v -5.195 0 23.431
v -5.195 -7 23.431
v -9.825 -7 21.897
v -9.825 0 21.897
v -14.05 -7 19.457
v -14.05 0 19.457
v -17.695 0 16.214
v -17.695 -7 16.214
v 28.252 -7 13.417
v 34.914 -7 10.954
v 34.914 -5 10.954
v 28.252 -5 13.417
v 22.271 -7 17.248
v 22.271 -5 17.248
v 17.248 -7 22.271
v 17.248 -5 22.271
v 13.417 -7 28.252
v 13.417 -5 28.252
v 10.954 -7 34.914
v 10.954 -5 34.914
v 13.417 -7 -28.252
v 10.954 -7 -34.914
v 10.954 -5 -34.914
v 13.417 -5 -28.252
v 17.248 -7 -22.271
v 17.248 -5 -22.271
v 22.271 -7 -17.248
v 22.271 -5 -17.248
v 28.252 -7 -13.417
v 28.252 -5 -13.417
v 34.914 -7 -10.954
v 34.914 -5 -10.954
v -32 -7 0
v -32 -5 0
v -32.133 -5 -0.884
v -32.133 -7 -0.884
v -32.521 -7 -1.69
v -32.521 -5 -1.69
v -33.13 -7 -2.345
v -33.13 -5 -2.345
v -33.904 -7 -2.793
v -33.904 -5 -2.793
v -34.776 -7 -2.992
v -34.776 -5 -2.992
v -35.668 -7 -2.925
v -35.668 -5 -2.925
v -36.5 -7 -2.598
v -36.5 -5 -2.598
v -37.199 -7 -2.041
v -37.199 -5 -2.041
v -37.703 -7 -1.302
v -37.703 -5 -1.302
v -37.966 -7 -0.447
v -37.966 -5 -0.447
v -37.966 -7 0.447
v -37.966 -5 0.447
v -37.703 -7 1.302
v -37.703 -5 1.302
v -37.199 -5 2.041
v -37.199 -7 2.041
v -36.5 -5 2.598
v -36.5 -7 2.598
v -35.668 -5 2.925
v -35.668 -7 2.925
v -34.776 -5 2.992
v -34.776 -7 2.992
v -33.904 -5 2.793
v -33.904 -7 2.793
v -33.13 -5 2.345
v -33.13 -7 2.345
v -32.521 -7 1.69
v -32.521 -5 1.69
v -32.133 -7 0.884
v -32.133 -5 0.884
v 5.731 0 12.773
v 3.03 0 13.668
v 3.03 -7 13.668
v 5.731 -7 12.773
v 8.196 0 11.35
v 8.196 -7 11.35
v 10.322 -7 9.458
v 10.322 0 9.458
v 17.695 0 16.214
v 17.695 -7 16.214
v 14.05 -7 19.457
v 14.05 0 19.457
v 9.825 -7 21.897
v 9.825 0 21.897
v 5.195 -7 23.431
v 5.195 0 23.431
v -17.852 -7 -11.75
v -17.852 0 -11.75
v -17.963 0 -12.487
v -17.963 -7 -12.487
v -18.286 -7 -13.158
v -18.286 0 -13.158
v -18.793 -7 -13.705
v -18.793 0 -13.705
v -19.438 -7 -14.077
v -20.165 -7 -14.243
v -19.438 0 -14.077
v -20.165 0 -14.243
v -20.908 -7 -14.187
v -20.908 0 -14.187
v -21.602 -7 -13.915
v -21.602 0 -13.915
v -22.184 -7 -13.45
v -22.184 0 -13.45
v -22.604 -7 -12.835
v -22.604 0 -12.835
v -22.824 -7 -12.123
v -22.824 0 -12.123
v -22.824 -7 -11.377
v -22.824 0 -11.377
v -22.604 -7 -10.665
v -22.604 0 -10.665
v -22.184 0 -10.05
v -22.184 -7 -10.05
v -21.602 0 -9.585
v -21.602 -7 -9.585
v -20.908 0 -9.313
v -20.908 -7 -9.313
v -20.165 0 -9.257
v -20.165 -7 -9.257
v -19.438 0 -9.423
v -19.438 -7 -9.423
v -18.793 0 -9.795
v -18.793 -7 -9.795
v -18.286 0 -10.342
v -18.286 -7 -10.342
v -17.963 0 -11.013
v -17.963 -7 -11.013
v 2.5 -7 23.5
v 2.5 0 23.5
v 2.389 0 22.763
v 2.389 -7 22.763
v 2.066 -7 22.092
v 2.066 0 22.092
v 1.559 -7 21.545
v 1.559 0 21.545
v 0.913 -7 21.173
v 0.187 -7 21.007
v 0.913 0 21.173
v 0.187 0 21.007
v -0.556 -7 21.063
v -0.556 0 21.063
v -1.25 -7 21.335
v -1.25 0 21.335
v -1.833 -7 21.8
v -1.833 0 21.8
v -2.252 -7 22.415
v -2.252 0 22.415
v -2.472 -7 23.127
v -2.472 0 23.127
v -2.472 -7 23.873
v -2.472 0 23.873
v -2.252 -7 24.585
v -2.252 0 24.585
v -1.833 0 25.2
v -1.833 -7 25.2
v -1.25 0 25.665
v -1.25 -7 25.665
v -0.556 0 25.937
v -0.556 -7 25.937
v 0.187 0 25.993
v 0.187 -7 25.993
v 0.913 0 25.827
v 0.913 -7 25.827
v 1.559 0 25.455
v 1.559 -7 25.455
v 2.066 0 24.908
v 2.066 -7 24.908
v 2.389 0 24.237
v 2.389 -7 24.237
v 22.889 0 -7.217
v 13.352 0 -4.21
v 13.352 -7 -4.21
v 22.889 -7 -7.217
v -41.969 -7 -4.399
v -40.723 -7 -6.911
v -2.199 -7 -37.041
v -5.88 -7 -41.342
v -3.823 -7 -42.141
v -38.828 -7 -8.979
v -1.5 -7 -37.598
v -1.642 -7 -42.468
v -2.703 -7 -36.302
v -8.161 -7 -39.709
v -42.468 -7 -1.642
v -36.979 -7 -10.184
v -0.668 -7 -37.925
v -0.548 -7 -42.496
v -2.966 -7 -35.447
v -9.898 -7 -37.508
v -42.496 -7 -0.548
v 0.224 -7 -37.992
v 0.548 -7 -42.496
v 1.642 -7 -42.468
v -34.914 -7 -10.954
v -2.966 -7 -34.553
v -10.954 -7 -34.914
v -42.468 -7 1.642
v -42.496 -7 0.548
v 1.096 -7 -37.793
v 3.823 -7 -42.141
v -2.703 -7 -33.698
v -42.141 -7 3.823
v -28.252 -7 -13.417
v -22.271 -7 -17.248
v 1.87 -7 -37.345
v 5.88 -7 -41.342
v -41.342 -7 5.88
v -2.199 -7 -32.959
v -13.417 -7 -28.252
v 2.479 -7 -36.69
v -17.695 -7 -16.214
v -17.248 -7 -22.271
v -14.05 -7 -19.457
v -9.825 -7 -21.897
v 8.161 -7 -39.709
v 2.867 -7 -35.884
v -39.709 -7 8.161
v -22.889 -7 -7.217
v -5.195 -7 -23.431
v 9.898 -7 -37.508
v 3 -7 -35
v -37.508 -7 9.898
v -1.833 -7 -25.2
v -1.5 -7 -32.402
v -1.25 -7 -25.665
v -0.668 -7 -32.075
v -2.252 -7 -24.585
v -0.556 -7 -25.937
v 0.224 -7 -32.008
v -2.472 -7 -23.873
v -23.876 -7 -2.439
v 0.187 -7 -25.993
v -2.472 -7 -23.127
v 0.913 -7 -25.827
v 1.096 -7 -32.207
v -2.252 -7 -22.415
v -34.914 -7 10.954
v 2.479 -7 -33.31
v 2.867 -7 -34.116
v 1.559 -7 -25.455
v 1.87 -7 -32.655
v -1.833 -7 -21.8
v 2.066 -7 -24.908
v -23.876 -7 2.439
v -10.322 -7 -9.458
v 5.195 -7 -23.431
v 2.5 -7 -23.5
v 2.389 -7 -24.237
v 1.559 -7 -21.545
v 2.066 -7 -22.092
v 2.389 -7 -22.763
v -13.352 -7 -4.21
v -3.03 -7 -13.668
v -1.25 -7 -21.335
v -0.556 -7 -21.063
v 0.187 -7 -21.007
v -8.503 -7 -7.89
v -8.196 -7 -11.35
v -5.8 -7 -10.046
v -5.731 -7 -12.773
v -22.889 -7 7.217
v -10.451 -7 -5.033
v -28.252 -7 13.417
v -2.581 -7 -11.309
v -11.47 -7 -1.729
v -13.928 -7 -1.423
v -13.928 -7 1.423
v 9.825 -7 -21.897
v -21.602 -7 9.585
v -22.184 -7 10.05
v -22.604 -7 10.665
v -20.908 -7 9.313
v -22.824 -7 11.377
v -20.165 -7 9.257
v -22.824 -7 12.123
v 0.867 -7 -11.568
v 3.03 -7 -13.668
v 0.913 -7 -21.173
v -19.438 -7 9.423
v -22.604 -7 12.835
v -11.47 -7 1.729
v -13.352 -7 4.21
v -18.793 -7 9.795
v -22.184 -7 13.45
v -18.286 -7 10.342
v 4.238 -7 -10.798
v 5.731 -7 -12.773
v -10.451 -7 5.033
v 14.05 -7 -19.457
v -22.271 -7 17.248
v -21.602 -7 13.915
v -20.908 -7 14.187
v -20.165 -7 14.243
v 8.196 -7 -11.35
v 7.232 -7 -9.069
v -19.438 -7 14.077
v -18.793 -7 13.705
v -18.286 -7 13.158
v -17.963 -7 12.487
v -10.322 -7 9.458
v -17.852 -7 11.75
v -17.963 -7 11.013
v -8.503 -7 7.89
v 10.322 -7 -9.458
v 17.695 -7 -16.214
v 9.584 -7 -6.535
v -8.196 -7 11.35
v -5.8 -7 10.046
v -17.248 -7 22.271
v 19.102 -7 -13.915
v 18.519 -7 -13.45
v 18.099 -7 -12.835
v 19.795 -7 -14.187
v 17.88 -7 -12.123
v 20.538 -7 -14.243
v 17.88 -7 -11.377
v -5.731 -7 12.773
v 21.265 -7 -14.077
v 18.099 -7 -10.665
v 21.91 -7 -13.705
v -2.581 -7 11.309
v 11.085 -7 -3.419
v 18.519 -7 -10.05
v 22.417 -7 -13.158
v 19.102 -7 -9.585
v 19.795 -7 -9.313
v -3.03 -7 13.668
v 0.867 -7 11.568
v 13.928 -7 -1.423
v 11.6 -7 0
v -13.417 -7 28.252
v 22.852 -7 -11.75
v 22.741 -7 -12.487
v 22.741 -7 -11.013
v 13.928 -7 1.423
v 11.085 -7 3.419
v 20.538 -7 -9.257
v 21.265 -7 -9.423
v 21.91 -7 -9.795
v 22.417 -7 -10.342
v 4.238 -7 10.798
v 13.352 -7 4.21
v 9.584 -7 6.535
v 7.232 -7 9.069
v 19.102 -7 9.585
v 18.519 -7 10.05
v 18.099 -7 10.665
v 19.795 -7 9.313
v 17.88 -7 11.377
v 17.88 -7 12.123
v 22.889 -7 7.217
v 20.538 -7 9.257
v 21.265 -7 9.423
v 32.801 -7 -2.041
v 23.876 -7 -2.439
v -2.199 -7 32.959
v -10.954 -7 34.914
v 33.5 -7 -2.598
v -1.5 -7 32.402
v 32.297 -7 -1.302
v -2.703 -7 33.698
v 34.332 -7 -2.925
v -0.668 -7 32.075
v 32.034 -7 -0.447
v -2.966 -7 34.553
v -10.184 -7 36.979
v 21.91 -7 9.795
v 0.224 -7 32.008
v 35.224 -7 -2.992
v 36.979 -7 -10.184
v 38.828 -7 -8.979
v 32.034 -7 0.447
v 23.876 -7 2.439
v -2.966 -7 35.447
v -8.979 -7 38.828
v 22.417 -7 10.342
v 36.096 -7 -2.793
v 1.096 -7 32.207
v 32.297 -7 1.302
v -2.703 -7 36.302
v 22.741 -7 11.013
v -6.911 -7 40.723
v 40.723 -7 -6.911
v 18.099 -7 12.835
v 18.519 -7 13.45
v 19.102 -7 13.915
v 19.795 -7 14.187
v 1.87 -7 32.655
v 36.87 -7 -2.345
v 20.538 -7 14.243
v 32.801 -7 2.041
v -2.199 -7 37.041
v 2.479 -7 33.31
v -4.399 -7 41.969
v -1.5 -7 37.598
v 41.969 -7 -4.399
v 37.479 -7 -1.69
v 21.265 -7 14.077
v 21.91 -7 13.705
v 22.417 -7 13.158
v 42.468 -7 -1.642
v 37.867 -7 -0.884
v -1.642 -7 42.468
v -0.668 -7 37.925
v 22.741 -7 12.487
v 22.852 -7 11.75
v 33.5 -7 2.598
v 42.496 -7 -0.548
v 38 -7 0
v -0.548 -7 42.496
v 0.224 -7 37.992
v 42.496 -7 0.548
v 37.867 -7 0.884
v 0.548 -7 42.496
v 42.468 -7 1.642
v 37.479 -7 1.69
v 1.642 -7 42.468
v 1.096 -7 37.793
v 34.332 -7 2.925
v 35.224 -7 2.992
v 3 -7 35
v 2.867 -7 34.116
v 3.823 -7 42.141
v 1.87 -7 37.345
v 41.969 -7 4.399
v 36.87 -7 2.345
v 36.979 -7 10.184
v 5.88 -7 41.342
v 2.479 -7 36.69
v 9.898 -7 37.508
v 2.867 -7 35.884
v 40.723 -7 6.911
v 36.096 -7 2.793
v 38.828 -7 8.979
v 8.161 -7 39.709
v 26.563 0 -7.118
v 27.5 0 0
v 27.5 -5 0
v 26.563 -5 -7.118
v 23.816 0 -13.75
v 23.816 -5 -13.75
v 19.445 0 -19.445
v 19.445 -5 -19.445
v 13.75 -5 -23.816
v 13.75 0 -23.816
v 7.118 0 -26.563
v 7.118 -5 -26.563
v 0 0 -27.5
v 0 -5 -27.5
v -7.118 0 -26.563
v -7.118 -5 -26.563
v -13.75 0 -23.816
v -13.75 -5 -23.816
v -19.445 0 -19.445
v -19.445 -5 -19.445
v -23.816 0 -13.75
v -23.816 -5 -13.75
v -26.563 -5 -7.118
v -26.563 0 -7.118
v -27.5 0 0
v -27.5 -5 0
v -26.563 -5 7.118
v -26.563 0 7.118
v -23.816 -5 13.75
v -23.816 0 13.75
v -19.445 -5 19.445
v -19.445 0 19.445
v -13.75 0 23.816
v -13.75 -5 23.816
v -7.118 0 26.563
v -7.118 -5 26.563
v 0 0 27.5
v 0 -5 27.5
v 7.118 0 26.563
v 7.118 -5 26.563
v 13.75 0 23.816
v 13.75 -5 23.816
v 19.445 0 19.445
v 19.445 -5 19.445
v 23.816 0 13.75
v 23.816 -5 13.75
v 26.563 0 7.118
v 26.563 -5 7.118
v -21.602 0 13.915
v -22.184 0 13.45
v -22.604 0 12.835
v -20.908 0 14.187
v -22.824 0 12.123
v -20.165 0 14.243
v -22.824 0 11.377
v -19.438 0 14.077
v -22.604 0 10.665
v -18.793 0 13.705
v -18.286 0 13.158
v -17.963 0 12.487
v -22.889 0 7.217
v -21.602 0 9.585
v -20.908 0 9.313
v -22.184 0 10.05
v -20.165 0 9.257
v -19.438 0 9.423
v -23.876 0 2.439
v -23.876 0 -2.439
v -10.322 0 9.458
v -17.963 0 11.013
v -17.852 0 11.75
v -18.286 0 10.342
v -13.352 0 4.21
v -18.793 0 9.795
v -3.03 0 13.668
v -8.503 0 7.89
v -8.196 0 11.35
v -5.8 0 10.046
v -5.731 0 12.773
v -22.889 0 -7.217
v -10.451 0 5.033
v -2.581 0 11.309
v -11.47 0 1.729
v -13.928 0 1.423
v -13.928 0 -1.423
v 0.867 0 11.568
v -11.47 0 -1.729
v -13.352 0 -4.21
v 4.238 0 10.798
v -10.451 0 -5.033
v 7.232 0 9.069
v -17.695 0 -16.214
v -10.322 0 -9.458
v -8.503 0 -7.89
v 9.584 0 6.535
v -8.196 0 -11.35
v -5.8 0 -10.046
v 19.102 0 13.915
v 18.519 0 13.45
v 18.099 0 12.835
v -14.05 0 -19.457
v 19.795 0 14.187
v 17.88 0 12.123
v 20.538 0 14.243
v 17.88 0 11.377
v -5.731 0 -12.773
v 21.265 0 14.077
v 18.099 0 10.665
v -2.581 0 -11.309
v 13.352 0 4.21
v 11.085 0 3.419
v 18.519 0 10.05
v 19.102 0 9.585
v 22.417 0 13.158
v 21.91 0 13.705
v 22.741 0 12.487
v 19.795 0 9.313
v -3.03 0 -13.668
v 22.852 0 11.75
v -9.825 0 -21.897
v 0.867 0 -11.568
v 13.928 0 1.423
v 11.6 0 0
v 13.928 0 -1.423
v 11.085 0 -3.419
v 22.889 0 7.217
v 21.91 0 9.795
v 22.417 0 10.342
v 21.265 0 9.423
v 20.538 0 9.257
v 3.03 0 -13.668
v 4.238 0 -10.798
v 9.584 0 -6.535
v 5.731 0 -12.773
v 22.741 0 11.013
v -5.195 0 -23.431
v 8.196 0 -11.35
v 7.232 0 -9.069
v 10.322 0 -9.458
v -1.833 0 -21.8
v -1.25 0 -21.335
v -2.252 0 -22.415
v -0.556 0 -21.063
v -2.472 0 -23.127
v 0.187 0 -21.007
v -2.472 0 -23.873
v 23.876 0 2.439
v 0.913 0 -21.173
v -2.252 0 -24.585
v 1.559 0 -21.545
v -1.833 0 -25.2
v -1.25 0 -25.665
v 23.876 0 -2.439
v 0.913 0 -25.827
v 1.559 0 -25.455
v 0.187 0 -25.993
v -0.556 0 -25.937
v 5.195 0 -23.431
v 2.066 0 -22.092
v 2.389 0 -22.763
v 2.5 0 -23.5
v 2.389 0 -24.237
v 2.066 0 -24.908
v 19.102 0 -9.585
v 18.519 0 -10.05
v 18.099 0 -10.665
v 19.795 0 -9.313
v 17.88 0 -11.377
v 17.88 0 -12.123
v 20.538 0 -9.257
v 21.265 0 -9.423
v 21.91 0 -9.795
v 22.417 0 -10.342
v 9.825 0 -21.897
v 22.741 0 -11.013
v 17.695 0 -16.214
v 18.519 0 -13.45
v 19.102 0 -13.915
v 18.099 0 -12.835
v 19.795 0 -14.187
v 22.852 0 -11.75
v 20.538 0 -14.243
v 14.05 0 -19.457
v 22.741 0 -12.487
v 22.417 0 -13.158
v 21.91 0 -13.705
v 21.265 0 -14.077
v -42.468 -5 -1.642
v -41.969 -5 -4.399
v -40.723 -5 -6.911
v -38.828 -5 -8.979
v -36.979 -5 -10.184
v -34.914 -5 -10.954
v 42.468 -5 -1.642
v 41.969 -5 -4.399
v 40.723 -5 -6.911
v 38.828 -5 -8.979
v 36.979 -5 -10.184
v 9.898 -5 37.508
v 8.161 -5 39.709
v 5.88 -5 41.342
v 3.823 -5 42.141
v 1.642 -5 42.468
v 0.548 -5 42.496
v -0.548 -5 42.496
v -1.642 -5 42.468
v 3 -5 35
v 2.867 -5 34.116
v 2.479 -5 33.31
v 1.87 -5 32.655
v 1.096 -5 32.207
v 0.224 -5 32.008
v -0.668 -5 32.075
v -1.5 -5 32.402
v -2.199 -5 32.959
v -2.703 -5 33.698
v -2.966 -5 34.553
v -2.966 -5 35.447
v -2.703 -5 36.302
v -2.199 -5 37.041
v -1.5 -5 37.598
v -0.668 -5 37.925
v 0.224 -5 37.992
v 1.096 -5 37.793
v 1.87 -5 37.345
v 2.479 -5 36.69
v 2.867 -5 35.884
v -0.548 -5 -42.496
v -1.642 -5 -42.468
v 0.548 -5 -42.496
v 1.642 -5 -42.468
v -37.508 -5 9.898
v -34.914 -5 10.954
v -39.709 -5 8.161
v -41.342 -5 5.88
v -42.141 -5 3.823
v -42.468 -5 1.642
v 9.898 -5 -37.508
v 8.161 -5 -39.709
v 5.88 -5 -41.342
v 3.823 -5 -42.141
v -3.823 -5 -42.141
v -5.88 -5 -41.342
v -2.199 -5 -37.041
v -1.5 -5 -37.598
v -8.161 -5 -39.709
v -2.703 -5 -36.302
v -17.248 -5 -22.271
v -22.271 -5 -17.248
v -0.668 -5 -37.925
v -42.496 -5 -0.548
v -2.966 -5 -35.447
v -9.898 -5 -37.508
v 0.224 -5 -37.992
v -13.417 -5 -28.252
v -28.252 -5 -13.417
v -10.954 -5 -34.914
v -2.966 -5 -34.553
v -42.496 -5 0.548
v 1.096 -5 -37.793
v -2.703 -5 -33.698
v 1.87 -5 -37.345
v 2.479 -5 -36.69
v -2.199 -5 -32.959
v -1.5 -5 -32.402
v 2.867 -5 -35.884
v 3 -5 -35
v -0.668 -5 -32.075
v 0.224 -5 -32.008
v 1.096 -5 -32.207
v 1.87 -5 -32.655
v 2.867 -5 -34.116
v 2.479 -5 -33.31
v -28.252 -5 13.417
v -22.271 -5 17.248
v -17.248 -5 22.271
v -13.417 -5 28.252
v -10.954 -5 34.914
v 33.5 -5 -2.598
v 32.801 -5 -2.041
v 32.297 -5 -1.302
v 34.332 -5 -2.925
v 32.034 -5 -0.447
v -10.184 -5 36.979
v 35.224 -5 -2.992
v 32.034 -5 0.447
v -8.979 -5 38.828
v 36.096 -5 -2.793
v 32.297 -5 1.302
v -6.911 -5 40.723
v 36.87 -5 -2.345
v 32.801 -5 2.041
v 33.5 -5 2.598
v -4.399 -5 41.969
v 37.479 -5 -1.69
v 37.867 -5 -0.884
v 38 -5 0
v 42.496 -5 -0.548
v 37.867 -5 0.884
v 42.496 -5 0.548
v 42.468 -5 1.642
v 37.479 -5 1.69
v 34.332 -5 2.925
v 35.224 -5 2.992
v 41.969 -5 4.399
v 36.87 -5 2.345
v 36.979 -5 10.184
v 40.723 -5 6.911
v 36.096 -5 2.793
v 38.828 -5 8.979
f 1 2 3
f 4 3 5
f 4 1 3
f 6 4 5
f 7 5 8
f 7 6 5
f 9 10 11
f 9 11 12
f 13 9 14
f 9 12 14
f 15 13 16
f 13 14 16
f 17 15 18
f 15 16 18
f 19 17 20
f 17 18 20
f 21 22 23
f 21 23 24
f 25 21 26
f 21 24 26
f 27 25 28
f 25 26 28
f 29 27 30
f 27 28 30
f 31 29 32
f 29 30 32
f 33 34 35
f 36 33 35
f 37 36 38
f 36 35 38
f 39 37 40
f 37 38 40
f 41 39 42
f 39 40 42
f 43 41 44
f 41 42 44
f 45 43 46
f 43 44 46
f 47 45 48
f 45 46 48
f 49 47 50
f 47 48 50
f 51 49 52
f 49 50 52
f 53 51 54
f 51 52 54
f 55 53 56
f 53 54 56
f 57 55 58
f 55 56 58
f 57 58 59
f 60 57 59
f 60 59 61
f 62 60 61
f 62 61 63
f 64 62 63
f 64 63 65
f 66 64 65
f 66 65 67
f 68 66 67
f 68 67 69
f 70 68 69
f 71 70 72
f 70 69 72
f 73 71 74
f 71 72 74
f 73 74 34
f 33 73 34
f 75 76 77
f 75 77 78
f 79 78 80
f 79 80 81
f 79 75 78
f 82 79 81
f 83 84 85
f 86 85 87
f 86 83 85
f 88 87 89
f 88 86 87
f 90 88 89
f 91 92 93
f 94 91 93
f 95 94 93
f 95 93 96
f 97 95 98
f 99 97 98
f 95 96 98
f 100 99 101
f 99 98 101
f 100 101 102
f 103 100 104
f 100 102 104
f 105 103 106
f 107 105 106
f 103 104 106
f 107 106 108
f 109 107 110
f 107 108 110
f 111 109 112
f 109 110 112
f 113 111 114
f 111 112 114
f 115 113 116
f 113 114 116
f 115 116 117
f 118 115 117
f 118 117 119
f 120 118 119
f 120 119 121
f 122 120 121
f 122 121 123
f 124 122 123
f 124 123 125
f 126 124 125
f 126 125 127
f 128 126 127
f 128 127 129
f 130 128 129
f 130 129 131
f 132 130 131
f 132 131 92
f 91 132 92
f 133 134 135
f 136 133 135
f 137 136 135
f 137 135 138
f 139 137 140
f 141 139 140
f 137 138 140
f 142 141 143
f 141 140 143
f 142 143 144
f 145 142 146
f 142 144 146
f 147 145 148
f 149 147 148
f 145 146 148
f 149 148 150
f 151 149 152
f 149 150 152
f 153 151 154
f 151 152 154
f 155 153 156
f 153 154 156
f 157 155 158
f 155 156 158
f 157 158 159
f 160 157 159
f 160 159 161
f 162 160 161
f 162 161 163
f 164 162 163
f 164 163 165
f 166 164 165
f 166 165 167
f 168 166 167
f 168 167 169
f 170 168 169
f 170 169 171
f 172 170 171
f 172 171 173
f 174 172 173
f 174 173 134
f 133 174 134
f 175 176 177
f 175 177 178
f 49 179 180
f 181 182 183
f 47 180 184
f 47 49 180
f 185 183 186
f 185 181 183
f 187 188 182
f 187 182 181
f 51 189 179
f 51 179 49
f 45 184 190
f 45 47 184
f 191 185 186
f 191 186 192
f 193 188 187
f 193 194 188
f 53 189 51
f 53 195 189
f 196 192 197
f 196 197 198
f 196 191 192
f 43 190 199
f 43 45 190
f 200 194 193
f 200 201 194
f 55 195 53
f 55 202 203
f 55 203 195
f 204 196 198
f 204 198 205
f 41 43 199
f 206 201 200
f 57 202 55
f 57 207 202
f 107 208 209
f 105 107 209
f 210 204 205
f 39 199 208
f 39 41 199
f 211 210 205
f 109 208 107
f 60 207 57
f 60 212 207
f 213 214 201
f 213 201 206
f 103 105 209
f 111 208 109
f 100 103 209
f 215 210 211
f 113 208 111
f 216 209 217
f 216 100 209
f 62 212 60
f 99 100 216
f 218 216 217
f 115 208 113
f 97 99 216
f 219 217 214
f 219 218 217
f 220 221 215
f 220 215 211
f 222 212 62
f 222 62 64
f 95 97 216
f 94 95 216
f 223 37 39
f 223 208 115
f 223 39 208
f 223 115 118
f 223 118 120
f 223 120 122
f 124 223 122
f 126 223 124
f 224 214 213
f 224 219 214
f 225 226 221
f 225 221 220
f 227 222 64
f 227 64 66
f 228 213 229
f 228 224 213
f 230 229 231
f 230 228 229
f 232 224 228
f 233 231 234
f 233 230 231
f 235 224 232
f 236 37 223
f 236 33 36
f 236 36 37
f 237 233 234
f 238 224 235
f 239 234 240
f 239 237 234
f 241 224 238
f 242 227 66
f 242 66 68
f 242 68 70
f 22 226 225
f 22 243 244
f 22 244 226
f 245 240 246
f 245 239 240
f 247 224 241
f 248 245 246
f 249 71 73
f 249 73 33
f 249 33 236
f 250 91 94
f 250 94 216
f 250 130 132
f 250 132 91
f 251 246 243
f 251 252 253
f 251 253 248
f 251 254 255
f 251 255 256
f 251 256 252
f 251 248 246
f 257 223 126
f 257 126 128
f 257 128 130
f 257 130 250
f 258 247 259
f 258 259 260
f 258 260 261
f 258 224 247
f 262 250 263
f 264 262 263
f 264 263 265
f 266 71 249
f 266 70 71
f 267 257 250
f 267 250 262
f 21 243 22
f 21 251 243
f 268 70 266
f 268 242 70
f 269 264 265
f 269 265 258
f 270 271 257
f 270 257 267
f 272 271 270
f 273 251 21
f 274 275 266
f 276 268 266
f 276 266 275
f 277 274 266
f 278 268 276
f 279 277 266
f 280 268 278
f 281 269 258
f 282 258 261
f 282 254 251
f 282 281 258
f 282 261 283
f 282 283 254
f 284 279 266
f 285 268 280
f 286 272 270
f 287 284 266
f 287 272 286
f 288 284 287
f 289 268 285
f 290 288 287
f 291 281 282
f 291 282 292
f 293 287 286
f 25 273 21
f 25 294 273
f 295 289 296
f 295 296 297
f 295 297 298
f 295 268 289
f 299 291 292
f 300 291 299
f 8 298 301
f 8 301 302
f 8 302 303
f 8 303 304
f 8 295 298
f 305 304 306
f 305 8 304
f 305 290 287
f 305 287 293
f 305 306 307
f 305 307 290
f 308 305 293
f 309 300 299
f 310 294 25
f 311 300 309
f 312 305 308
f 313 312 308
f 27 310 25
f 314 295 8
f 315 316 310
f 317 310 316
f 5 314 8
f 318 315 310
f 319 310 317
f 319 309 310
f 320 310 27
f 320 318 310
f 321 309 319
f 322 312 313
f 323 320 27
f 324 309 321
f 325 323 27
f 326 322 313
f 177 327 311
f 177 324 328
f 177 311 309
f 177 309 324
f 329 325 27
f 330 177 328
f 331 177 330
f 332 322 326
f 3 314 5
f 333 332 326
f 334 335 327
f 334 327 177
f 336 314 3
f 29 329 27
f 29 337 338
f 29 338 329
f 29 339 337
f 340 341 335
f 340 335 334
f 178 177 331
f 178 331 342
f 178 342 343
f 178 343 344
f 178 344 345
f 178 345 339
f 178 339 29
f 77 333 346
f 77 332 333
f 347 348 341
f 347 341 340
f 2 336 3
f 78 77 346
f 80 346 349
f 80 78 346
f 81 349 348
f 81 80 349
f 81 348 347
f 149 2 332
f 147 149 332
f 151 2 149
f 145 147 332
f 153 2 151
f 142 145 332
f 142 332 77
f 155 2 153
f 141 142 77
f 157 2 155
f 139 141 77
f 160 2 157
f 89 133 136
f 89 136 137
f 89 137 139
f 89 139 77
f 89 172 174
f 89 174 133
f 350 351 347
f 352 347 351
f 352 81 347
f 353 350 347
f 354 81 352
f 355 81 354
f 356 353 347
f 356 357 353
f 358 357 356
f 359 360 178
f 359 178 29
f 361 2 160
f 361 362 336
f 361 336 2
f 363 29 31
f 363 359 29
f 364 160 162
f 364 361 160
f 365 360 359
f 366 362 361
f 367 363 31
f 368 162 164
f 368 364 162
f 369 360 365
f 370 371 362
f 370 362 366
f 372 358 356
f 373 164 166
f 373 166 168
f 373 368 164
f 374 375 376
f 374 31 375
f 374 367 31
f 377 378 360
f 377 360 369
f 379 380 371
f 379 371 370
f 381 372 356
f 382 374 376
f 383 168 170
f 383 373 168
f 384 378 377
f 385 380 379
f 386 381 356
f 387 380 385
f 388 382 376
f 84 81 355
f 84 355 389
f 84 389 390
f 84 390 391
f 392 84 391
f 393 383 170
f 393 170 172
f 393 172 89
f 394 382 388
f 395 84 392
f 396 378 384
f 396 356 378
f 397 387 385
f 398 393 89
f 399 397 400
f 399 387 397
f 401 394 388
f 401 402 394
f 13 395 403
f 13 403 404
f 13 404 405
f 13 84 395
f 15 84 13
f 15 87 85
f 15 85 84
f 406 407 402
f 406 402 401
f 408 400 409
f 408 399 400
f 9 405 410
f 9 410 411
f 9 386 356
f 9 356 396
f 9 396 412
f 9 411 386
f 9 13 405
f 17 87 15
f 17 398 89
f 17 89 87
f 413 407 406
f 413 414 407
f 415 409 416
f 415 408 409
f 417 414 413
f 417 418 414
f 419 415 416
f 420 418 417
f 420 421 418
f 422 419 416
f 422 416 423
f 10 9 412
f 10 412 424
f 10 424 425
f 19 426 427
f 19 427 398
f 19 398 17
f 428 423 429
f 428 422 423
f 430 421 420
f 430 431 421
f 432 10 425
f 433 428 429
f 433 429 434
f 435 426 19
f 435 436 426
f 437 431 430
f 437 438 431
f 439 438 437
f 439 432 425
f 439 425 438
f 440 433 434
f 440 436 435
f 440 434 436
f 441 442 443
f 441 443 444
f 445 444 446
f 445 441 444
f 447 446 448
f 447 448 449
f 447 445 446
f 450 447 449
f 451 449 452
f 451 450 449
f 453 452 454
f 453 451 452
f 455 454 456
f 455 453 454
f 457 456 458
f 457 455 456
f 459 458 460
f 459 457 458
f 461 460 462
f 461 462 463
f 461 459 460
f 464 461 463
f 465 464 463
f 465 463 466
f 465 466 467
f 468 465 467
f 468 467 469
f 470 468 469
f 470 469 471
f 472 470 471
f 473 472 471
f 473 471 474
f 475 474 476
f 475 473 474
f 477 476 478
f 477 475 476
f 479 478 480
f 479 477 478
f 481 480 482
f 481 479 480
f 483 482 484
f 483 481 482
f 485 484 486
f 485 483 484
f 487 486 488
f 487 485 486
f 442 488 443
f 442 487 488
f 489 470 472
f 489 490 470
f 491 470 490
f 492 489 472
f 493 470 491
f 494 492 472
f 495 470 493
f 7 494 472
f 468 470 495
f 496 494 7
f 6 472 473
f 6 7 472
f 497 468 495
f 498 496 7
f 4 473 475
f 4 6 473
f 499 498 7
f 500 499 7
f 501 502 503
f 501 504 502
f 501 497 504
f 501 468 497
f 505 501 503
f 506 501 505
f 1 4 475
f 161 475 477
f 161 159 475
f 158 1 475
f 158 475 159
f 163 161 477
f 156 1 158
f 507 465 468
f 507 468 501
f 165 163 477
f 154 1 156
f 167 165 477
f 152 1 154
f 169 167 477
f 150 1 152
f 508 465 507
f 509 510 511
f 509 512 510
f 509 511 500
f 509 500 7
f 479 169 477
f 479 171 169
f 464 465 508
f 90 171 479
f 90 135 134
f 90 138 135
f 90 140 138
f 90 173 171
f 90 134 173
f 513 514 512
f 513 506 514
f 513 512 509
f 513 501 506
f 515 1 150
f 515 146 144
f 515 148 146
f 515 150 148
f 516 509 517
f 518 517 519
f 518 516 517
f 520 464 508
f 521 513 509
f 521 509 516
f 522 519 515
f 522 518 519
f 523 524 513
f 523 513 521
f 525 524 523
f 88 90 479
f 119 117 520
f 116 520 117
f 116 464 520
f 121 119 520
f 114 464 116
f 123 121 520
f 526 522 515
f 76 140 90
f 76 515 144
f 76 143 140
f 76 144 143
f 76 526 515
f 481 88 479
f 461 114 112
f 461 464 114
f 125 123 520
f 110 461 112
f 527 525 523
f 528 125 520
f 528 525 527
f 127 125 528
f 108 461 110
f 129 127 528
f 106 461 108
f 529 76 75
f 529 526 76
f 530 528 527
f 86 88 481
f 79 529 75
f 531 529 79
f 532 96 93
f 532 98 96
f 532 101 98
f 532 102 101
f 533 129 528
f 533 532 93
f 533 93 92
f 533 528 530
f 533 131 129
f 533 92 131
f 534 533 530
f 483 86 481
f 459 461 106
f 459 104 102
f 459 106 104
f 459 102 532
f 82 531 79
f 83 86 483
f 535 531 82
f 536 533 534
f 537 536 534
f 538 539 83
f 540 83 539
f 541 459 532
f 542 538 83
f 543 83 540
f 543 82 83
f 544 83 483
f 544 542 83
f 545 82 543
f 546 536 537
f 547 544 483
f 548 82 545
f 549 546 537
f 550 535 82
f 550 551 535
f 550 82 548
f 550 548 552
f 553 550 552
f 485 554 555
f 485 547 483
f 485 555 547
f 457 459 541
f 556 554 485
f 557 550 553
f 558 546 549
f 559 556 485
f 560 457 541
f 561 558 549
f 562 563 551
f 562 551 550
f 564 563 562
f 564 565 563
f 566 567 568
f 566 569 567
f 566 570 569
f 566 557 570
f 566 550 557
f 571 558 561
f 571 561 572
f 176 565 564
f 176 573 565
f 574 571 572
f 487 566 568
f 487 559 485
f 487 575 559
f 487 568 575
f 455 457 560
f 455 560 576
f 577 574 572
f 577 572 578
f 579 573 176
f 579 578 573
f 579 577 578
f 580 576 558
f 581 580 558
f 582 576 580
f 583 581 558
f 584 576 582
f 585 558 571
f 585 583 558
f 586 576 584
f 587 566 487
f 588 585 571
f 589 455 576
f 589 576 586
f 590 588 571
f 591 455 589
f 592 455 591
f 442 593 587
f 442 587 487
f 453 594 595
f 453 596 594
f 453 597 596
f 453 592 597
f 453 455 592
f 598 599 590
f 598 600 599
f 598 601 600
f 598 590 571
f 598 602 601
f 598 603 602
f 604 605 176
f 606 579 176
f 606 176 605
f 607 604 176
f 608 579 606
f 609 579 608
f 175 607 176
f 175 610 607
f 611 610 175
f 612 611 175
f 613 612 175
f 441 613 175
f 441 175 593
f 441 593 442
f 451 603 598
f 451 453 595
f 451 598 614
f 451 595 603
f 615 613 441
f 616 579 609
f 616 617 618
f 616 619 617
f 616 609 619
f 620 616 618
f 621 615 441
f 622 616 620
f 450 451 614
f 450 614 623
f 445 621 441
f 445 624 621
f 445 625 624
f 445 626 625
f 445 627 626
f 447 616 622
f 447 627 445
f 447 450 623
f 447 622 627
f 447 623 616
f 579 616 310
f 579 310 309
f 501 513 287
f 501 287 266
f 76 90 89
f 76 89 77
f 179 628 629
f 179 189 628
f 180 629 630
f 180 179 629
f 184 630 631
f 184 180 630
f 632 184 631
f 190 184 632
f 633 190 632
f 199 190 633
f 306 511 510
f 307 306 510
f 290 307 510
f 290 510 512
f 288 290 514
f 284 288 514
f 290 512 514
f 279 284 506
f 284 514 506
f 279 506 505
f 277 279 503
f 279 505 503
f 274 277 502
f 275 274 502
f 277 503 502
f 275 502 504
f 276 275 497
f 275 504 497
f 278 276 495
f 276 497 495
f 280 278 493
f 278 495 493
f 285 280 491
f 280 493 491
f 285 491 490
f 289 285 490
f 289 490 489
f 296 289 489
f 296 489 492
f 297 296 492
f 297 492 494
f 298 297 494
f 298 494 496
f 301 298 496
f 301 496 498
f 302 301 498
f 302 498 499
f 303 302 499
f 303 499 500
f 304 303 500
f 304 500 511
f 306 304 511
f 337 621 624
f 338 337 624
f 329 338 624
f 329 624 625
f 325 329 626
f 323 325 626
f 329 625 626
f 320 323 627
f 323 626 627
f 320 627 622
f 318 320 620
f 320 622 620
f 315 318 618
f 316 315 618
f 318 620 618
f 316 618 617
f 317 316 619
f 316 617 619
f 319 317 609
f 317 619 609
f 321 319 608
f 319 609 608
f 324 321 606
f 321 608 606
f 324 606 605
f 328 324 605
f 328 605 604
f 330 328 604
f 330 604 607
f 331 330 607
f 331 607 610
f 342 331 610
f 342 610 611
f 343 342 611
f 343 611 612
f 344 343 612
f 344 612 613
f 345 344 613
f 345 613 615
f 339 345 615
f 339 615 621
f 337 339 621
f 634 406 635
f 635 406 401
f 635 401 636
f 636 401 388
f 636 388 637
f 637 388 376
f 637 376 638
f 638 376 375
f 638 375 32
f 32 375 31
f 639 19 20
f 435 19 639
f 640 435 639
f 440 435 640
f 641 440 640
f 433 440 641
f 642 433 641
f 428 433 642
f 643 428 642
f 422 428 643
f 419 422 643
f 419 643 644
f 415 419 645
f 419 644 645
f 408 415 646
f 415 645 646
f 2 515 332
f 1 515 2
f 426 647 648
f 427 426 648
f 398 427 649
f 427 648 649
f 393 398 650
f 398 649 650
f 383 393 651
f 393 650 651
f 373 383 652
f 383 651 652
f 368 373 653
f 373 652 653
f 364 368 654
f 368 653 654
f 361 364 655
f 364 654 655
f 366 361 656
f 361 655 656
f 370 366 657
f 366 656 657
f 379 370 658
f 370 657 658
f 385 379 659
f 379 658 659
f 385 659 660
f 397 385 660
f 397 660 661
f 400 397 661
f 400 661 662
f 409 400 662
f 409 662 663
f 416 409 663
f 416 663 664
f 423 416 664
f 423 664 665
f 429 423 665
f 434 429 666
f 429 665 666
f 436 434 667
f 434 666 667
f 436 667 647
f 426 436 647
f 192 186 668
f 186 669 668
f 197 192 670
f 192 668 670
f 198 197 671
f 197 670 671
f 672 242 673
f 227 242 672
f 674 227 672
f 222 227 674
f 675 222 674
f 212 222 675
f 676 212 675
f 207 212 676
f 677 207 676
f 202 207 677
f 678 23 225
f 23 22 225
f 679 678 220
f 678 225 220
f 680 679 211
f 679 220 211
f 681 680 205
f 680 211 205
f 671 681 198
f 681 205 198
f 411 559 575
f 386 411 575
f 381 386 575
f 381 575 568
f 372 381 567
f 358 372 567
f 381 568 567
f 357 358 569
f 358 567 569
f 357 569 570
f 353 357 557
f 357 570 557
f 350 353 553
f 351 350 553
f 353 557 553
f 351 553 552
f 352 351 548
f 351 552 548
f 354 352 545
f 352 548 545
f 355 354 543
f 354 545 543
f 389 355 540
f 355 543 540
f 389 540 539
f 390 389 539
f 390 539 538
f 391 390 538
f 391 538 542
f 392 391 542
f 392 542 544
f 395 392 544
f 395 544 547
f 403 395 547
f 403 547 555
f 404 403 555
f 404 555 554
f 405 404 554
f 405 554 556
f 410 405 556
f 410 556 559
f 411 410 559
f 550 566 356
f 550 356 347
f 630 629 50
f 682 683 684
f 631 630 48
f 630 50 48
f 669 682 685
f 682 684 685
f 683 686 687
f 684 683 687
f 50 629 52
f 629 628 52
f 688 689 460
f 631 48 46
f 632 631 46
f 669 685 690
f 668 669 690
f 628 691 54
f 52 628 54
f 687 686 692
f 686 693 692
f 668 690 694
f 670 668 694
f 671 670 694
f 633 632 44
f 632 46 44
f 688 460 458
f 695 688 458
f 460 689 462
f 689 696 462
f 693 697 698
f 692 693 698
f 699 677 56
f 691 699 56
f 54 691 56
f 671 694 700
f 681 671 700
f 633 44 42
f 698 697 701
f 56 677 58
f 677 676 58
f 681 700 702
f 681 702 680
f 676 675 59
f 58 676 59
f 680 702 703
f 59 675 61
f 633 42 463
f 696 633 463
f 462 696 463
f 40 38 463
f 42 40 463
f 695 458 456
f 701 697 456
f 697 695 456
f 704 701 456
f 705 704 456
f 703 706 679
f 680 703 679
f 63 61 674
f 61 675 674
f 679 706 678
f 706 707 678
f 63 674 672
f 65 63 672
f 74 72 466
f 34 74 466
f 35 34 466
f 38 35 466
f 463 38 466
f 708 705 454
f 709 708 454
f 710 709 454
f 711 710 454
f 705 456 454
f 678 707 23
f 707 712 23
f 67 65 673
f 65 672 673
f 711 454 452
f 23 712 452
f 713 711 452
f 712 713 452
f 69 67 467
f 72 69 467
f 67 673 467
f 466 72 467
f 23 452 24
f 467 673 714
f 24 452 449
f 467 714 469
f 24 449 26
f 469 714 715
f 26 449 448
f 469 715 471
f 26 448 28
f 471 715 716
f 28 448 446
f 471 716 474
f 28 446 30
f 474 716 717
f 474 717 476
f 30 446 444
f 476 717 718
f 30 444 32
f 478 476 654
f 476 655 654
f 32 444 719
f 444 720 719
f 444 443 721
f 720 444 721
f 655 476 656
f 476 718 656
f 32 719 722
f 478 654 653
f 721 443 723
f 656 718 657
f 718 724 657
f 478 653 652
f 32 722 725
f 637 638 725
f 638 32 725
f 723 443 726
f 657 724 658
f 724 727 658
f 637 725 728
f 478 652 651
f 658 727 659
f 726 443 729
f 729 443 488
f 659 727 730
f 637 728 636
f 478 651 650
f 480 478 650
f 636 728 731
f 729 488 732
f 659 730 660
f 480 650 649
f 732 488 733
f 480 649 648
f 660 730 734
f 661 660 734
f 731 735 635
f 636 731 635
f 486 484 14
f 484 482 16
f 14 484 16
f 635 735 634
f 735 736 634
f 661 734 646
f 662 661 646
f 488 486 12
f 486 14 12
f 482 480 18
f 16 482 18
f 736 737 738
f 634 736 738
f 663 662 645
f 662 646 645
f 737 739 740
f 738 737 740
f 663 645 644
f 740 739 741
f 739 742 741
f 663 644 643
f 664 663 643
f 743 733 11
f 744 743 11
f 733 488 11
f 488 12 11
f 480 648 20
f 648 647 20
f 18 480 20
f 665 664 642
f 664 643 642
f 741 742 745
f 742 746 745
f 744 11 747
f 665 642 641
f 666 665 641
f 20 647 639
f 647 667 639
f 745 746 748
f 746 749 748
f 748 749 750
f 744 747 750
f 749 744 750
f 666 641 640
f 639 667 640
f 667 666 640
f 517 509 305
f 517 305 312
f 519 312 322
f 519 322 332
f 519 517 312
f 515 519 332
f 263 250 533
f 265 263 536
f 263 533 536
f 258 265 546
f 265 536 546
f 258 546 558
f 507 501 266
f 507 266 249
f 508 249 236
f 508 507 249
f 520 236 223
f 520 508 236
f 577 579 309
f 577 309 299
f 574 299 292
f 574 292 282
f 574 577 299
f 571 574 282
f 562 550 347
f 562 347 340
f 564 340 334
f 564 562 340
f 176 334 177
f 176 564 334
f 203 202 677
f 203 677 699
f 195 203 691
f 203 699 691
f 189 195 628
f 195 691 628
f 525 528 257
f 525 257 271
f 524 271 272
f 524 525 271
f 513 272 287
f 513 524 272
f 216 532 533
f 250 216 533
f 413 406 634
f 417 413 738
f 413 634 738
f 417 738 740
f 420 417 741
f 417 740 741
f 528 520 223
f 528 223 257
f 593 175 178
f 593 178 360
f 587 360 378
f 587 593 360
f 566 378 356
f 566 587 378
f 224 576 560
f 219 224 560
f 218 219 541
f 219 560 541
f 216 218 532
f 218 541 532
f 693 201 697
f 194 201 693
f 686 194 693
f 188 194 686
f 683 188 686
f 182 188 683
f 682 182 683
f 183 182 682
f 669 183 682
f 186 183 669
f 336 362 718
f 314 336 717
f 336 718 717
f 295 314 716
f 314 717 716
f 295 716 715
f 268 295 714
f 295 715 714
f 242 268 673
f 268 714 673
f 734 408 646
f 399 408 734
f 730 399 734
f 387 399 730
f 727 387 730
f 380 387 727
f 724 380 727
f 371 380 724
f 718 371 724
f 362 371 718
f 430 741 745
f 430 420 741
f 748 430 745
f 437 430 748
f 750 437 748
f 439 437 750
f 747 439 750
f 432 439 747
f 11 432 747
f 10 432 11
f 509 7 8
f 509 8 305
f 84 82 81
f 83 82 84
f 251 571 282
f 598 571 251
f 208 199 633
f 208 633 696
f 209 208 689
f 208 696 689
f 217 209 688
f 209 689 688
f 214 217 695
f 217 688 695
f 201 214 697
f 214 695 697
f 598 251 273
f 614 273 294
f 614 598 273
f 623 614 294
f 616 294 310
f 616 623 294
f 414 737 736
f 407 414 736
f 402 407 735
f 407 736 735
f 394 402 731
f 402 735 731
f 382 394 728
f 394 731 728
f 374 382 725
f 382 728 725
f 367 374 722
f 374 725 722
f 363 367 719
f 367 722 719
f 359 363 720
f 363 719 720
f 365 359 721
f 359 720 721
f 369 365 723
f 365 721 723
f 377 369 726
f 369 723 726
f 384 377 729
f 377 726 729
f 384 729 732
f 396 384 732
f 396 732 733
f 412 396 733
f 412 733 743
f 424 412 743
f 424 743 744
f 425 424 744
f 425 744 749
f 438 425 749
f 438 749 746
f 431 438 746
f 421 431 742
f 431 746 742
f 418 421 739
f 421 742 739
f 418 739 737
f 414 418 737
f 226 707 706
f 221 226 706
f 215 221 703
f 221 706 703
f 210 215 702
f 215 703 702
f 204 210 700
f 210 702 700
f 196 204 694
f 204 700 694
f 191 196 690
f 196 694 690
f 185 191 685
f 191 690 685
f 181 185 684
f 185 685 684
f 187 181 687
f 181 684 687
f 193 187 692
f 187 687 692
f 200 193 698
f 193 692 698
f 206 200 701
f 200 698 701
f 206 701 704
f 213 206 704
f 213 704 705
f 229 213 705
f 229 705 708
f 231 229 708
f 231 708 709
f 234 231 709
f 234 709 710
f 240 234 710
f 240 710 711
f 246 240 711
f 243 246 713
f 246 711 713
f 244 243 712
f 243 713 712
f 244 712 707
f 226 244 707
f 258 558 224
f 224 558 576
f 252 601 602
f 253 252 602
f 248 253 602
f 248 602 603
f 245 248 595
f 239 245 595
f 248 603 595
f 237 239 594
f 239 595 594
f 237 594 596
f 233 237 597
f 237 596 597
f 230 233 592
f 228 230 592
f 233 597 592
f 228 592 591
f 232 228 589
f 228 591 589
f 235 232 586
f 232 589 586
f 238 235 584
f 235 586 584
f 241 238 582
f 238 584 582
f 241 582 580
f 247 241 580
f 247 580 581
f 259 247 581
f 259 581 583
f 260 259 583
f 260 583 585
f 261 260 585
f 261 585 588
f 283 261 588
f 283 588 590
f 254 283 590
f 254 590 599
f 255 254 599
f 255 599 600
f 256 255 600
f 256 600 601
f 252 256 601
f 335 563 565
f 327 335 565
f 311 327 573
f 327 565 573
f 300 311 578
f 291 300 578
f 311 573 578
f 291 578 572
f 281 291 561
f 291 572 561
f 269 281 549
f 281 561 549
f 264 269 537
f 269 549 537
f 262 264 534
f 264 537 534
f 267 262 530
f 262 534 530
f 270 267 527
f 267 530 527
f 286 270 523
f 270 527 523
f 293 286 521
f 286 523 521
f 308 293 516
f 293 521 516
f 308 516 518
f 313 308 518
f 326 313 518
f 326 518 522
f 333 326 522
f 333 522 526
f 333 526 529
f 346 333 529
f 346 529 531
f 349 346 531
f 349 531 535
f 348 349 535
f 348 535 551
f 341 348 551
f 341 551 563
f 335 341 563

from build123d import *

# Parameters (mm, degrees)
SKETCH1_R           = 27.5
BOSS_EXTRUDE1_DEPTH = 5
SKETCH2_R           = 42.5
BOSS_EXTRUDE2_DEPTH = 2
SKETCH3_R           = 3
CUT_EXTRUDE1_DEPTH  = 2
SKETCH4_R           = 11.6
SKETCH4_R_2         = 2.5
CUT_EXTRUDE2_DEPTH  = 8
CUT_EXTRUDE3_DEPTH  = 8
FILLET1_R           = 10


with BuildPart() as part:
    # Sketch1 → Boss-Extrude1 (new body)
    with BuildSketch(Plane(origin=(0, 0, 0), x_dir=(1, 0, 0), z_dir=(0, 1, 0))):
        Circle(SKETCH1_R)
    extrude(amount=-BOSS_EXTRUDE1_DEPTH)

    # Sketch2 → Boss-Extrude2 (add)
    with BuildSketch(Plane.XZ.offset(5)):
        Circle(SKETCH2_R)
    extrude(amount=BOSS_EXTRUDE2_DEPTH)

    # Sketch3 → Cut-Extrude1 (cut)
    with BuildSketch(Plane(origin=(0, -5, 0), x_dir=(1, 0, 0), z_dir=(0, 1, 0))):
        with BuildLine():
            ThreePointArc((-41.306779105, 10), (-19.624107624, 19.624107624), (-10, 41.306779105))
            ThreePointArc((-10, 41.306779105), (-30.0520382, 30.0520382), (-41.306779105, 10))
        make_face()
        with Locations((0, 35)):
            Circle(SKETCH3_R)
        with BuildLine():
            ThreePointArc((41.306779105, 10), (30.0520382, 30.0520382), (10, 41.306779105))
            ThreePointArc((10, 41.306779105), (19.624107624, 19.624107624), (41.306779105, 10))
        make_face()
        with Locations((35, 0)):
            Circle(SKETCH3_R)
        with Locations((0, -35)):
            Circle(SKETCH3_R)
        with BuildLine():
            ThreePointArc((41.306779105, -10), (19.624107624, -19.624107624), (10, -41.306779105))
            ThreePointArc((10, -41.306779105), (30.0520382, -30.0520382), (41.306779105, -10))
        make_face()
        with BuildLine():
            ThreePointArc((-10, -41.306779105), (-19.624107624, -19.624107624), (-41.306779105, -10))
            ThreePointArc((-41.306779105, -10), (-30.0520382, -30.0520382), (-10, -41.306779105))
        make_face()
        with Locations((-35, 0)):
            Circle(SKETCH3_R)
    extrude(amount=-CUT_EXTRUDE1_DEPTH, mode=Mode.SUBTRACT)

    # Sketch4 → Cut-Extrude2 (cut, through all)
    with BuildSketch(Plane(origin=(0, 0, 0), x_dir=(1, 0, 0), z_dir=(0, 1, 0))):
        Circle(SKETCH4_R)
        with Locations((0, 23.5)):
            Circle(SKETCH4_R_2)
        with Locations((20.351596989, 11.75)):
            Circle(SKETCH4_R_2)
        with Locations((20.351596989, -11.75)):
            Circle(SKETCH4_R_2)
        with Locations((0, -23.5)):
            Circle(SKETCH4_R_2)
        with Locations((-20.351596989, -11.75)):
            Circle(SKETCH4_R_2)
        with Locations((-20.351596989, 11.75)):
            Circle(SKETCH4_R_2)
    extrude(amount=-CUT_EXTRUDE2_DEPTH, mode=Mode.SUBTRACT)

    # Sketch5 → Cut-Extrude3 (cut, through all)
    with BuildSketch(Plane(origin=(0, 0, 0), x_dir=(1, 0, 0), z_dir=(0, 1, 0))):
        with BuildLine():
            Line((-17.694656083, 16.214164983), (-10.321882715, 9.458262907))
            ThreePointArc((-10.321882715, 9.458262907), (-7, 12.124355653), (-3.030154595, 13.6681441))
            Line((-3.030154595, 13.6681441), (-5.194550735, 23.431104171))
            ThreePointArc((-5.194550735, 23.431104171), (-12, 20.784609691), (-17.694656083, 16.214164983))
        make_face()
        with BuildLine():
            Line((17.694656083, 16.214164983), (10.321882715, 9.458262907))
            ThreePointArc((10.321882715, 9.458262907), (7, 12.124355653), (3.030154595, 13.6681441))
            Line((3.030154595, 13.6681441), (5.194550735, 23.431104171))
            ThreePointArc((5.194550735, 23.431104171), (12, 20.784609691), (17.694656083, 16.214164983))
        make_face()
        with BuildLine():
            Line((22.889206818, -7.216939188), (13.35203731, -4.209881193))
            ThreePointArc((13.35203731, -4.209881193), (14, 0), (13.35203731, 4.209881193))
            Line((13.35203731, 4.209881193), (22.889206818, 7.216939188))
            ThreePointArc((22.889206818, 7.216939188), (24, 0), (22.889206818, -7.216939188))
        make_face()
        with BuildLine():
            Line((5.194550735, -23.431104171), (3.030154595, -13.6681441))
            ThreePointArc((3.030154595, -13.6681441), (7, -12.124355653), (10.321882715, -9.458262907))
            Line((10.321882715, -9.458262907), (17.694656083, -16.214164983))
            ThreePointArc((17.694656083, -16.214164983), (12, -20.784609691), (5.194550735, -23.431104171))
        make_face()
        with BuildLine():
            Line((-17.694656083, -16.214164983), (-10.321882715, -9.458262907))
            ThreePointArc((-10.321882715, -9.458262907), (-7, -12.124355653), (-3.030154595, -13.6681441))
            Line((-3.030154595, -13.6681441), (-5.194550735, -23.431104171))
            ThreePointArc((-5.194550735, -23.431104171), (-12, -20.784609691), (-17.694656083, -16.214164983))
        make_face()
        with BuildLine():
            Line((-22.889206818, 7.216939188), (-13.35203731, 4.209881193))
            ThreePointArc((-13.35203731, 4.209881193), (-14, 0), (-13.35203731, -4.209881193))
            Line((-13.35203731, -4.209881193), (-22.889206818, -7.216939188))
            ThreePointArc((-22.889206818, -7.216939188), (-24, 0), (-22.889206818, 7.216939188))
        make_face()
    extrude(amount=-CUT_EXTRUDE3_DEPTH, mode=Mode.SUBTRACT)

    # Fillet1
    fillet1_edges = [part.edges().sort_by_distance(p)[0] for p in [
        (41.306779105, -6, -10),
        (10, -6, -41.306779105),
        (10, -6, 41.306779105),
        (41.306779105, -6, 10),
        (-41.306779105, -6, 10),
        (-10, -6, 41.306779105),
        (-10, -6, -41.306779105),
        (-41.306779105, -6, -10),
    ]]
    fillet(fillet1_edges, radius=FILLET1_R)


solid = part.part
